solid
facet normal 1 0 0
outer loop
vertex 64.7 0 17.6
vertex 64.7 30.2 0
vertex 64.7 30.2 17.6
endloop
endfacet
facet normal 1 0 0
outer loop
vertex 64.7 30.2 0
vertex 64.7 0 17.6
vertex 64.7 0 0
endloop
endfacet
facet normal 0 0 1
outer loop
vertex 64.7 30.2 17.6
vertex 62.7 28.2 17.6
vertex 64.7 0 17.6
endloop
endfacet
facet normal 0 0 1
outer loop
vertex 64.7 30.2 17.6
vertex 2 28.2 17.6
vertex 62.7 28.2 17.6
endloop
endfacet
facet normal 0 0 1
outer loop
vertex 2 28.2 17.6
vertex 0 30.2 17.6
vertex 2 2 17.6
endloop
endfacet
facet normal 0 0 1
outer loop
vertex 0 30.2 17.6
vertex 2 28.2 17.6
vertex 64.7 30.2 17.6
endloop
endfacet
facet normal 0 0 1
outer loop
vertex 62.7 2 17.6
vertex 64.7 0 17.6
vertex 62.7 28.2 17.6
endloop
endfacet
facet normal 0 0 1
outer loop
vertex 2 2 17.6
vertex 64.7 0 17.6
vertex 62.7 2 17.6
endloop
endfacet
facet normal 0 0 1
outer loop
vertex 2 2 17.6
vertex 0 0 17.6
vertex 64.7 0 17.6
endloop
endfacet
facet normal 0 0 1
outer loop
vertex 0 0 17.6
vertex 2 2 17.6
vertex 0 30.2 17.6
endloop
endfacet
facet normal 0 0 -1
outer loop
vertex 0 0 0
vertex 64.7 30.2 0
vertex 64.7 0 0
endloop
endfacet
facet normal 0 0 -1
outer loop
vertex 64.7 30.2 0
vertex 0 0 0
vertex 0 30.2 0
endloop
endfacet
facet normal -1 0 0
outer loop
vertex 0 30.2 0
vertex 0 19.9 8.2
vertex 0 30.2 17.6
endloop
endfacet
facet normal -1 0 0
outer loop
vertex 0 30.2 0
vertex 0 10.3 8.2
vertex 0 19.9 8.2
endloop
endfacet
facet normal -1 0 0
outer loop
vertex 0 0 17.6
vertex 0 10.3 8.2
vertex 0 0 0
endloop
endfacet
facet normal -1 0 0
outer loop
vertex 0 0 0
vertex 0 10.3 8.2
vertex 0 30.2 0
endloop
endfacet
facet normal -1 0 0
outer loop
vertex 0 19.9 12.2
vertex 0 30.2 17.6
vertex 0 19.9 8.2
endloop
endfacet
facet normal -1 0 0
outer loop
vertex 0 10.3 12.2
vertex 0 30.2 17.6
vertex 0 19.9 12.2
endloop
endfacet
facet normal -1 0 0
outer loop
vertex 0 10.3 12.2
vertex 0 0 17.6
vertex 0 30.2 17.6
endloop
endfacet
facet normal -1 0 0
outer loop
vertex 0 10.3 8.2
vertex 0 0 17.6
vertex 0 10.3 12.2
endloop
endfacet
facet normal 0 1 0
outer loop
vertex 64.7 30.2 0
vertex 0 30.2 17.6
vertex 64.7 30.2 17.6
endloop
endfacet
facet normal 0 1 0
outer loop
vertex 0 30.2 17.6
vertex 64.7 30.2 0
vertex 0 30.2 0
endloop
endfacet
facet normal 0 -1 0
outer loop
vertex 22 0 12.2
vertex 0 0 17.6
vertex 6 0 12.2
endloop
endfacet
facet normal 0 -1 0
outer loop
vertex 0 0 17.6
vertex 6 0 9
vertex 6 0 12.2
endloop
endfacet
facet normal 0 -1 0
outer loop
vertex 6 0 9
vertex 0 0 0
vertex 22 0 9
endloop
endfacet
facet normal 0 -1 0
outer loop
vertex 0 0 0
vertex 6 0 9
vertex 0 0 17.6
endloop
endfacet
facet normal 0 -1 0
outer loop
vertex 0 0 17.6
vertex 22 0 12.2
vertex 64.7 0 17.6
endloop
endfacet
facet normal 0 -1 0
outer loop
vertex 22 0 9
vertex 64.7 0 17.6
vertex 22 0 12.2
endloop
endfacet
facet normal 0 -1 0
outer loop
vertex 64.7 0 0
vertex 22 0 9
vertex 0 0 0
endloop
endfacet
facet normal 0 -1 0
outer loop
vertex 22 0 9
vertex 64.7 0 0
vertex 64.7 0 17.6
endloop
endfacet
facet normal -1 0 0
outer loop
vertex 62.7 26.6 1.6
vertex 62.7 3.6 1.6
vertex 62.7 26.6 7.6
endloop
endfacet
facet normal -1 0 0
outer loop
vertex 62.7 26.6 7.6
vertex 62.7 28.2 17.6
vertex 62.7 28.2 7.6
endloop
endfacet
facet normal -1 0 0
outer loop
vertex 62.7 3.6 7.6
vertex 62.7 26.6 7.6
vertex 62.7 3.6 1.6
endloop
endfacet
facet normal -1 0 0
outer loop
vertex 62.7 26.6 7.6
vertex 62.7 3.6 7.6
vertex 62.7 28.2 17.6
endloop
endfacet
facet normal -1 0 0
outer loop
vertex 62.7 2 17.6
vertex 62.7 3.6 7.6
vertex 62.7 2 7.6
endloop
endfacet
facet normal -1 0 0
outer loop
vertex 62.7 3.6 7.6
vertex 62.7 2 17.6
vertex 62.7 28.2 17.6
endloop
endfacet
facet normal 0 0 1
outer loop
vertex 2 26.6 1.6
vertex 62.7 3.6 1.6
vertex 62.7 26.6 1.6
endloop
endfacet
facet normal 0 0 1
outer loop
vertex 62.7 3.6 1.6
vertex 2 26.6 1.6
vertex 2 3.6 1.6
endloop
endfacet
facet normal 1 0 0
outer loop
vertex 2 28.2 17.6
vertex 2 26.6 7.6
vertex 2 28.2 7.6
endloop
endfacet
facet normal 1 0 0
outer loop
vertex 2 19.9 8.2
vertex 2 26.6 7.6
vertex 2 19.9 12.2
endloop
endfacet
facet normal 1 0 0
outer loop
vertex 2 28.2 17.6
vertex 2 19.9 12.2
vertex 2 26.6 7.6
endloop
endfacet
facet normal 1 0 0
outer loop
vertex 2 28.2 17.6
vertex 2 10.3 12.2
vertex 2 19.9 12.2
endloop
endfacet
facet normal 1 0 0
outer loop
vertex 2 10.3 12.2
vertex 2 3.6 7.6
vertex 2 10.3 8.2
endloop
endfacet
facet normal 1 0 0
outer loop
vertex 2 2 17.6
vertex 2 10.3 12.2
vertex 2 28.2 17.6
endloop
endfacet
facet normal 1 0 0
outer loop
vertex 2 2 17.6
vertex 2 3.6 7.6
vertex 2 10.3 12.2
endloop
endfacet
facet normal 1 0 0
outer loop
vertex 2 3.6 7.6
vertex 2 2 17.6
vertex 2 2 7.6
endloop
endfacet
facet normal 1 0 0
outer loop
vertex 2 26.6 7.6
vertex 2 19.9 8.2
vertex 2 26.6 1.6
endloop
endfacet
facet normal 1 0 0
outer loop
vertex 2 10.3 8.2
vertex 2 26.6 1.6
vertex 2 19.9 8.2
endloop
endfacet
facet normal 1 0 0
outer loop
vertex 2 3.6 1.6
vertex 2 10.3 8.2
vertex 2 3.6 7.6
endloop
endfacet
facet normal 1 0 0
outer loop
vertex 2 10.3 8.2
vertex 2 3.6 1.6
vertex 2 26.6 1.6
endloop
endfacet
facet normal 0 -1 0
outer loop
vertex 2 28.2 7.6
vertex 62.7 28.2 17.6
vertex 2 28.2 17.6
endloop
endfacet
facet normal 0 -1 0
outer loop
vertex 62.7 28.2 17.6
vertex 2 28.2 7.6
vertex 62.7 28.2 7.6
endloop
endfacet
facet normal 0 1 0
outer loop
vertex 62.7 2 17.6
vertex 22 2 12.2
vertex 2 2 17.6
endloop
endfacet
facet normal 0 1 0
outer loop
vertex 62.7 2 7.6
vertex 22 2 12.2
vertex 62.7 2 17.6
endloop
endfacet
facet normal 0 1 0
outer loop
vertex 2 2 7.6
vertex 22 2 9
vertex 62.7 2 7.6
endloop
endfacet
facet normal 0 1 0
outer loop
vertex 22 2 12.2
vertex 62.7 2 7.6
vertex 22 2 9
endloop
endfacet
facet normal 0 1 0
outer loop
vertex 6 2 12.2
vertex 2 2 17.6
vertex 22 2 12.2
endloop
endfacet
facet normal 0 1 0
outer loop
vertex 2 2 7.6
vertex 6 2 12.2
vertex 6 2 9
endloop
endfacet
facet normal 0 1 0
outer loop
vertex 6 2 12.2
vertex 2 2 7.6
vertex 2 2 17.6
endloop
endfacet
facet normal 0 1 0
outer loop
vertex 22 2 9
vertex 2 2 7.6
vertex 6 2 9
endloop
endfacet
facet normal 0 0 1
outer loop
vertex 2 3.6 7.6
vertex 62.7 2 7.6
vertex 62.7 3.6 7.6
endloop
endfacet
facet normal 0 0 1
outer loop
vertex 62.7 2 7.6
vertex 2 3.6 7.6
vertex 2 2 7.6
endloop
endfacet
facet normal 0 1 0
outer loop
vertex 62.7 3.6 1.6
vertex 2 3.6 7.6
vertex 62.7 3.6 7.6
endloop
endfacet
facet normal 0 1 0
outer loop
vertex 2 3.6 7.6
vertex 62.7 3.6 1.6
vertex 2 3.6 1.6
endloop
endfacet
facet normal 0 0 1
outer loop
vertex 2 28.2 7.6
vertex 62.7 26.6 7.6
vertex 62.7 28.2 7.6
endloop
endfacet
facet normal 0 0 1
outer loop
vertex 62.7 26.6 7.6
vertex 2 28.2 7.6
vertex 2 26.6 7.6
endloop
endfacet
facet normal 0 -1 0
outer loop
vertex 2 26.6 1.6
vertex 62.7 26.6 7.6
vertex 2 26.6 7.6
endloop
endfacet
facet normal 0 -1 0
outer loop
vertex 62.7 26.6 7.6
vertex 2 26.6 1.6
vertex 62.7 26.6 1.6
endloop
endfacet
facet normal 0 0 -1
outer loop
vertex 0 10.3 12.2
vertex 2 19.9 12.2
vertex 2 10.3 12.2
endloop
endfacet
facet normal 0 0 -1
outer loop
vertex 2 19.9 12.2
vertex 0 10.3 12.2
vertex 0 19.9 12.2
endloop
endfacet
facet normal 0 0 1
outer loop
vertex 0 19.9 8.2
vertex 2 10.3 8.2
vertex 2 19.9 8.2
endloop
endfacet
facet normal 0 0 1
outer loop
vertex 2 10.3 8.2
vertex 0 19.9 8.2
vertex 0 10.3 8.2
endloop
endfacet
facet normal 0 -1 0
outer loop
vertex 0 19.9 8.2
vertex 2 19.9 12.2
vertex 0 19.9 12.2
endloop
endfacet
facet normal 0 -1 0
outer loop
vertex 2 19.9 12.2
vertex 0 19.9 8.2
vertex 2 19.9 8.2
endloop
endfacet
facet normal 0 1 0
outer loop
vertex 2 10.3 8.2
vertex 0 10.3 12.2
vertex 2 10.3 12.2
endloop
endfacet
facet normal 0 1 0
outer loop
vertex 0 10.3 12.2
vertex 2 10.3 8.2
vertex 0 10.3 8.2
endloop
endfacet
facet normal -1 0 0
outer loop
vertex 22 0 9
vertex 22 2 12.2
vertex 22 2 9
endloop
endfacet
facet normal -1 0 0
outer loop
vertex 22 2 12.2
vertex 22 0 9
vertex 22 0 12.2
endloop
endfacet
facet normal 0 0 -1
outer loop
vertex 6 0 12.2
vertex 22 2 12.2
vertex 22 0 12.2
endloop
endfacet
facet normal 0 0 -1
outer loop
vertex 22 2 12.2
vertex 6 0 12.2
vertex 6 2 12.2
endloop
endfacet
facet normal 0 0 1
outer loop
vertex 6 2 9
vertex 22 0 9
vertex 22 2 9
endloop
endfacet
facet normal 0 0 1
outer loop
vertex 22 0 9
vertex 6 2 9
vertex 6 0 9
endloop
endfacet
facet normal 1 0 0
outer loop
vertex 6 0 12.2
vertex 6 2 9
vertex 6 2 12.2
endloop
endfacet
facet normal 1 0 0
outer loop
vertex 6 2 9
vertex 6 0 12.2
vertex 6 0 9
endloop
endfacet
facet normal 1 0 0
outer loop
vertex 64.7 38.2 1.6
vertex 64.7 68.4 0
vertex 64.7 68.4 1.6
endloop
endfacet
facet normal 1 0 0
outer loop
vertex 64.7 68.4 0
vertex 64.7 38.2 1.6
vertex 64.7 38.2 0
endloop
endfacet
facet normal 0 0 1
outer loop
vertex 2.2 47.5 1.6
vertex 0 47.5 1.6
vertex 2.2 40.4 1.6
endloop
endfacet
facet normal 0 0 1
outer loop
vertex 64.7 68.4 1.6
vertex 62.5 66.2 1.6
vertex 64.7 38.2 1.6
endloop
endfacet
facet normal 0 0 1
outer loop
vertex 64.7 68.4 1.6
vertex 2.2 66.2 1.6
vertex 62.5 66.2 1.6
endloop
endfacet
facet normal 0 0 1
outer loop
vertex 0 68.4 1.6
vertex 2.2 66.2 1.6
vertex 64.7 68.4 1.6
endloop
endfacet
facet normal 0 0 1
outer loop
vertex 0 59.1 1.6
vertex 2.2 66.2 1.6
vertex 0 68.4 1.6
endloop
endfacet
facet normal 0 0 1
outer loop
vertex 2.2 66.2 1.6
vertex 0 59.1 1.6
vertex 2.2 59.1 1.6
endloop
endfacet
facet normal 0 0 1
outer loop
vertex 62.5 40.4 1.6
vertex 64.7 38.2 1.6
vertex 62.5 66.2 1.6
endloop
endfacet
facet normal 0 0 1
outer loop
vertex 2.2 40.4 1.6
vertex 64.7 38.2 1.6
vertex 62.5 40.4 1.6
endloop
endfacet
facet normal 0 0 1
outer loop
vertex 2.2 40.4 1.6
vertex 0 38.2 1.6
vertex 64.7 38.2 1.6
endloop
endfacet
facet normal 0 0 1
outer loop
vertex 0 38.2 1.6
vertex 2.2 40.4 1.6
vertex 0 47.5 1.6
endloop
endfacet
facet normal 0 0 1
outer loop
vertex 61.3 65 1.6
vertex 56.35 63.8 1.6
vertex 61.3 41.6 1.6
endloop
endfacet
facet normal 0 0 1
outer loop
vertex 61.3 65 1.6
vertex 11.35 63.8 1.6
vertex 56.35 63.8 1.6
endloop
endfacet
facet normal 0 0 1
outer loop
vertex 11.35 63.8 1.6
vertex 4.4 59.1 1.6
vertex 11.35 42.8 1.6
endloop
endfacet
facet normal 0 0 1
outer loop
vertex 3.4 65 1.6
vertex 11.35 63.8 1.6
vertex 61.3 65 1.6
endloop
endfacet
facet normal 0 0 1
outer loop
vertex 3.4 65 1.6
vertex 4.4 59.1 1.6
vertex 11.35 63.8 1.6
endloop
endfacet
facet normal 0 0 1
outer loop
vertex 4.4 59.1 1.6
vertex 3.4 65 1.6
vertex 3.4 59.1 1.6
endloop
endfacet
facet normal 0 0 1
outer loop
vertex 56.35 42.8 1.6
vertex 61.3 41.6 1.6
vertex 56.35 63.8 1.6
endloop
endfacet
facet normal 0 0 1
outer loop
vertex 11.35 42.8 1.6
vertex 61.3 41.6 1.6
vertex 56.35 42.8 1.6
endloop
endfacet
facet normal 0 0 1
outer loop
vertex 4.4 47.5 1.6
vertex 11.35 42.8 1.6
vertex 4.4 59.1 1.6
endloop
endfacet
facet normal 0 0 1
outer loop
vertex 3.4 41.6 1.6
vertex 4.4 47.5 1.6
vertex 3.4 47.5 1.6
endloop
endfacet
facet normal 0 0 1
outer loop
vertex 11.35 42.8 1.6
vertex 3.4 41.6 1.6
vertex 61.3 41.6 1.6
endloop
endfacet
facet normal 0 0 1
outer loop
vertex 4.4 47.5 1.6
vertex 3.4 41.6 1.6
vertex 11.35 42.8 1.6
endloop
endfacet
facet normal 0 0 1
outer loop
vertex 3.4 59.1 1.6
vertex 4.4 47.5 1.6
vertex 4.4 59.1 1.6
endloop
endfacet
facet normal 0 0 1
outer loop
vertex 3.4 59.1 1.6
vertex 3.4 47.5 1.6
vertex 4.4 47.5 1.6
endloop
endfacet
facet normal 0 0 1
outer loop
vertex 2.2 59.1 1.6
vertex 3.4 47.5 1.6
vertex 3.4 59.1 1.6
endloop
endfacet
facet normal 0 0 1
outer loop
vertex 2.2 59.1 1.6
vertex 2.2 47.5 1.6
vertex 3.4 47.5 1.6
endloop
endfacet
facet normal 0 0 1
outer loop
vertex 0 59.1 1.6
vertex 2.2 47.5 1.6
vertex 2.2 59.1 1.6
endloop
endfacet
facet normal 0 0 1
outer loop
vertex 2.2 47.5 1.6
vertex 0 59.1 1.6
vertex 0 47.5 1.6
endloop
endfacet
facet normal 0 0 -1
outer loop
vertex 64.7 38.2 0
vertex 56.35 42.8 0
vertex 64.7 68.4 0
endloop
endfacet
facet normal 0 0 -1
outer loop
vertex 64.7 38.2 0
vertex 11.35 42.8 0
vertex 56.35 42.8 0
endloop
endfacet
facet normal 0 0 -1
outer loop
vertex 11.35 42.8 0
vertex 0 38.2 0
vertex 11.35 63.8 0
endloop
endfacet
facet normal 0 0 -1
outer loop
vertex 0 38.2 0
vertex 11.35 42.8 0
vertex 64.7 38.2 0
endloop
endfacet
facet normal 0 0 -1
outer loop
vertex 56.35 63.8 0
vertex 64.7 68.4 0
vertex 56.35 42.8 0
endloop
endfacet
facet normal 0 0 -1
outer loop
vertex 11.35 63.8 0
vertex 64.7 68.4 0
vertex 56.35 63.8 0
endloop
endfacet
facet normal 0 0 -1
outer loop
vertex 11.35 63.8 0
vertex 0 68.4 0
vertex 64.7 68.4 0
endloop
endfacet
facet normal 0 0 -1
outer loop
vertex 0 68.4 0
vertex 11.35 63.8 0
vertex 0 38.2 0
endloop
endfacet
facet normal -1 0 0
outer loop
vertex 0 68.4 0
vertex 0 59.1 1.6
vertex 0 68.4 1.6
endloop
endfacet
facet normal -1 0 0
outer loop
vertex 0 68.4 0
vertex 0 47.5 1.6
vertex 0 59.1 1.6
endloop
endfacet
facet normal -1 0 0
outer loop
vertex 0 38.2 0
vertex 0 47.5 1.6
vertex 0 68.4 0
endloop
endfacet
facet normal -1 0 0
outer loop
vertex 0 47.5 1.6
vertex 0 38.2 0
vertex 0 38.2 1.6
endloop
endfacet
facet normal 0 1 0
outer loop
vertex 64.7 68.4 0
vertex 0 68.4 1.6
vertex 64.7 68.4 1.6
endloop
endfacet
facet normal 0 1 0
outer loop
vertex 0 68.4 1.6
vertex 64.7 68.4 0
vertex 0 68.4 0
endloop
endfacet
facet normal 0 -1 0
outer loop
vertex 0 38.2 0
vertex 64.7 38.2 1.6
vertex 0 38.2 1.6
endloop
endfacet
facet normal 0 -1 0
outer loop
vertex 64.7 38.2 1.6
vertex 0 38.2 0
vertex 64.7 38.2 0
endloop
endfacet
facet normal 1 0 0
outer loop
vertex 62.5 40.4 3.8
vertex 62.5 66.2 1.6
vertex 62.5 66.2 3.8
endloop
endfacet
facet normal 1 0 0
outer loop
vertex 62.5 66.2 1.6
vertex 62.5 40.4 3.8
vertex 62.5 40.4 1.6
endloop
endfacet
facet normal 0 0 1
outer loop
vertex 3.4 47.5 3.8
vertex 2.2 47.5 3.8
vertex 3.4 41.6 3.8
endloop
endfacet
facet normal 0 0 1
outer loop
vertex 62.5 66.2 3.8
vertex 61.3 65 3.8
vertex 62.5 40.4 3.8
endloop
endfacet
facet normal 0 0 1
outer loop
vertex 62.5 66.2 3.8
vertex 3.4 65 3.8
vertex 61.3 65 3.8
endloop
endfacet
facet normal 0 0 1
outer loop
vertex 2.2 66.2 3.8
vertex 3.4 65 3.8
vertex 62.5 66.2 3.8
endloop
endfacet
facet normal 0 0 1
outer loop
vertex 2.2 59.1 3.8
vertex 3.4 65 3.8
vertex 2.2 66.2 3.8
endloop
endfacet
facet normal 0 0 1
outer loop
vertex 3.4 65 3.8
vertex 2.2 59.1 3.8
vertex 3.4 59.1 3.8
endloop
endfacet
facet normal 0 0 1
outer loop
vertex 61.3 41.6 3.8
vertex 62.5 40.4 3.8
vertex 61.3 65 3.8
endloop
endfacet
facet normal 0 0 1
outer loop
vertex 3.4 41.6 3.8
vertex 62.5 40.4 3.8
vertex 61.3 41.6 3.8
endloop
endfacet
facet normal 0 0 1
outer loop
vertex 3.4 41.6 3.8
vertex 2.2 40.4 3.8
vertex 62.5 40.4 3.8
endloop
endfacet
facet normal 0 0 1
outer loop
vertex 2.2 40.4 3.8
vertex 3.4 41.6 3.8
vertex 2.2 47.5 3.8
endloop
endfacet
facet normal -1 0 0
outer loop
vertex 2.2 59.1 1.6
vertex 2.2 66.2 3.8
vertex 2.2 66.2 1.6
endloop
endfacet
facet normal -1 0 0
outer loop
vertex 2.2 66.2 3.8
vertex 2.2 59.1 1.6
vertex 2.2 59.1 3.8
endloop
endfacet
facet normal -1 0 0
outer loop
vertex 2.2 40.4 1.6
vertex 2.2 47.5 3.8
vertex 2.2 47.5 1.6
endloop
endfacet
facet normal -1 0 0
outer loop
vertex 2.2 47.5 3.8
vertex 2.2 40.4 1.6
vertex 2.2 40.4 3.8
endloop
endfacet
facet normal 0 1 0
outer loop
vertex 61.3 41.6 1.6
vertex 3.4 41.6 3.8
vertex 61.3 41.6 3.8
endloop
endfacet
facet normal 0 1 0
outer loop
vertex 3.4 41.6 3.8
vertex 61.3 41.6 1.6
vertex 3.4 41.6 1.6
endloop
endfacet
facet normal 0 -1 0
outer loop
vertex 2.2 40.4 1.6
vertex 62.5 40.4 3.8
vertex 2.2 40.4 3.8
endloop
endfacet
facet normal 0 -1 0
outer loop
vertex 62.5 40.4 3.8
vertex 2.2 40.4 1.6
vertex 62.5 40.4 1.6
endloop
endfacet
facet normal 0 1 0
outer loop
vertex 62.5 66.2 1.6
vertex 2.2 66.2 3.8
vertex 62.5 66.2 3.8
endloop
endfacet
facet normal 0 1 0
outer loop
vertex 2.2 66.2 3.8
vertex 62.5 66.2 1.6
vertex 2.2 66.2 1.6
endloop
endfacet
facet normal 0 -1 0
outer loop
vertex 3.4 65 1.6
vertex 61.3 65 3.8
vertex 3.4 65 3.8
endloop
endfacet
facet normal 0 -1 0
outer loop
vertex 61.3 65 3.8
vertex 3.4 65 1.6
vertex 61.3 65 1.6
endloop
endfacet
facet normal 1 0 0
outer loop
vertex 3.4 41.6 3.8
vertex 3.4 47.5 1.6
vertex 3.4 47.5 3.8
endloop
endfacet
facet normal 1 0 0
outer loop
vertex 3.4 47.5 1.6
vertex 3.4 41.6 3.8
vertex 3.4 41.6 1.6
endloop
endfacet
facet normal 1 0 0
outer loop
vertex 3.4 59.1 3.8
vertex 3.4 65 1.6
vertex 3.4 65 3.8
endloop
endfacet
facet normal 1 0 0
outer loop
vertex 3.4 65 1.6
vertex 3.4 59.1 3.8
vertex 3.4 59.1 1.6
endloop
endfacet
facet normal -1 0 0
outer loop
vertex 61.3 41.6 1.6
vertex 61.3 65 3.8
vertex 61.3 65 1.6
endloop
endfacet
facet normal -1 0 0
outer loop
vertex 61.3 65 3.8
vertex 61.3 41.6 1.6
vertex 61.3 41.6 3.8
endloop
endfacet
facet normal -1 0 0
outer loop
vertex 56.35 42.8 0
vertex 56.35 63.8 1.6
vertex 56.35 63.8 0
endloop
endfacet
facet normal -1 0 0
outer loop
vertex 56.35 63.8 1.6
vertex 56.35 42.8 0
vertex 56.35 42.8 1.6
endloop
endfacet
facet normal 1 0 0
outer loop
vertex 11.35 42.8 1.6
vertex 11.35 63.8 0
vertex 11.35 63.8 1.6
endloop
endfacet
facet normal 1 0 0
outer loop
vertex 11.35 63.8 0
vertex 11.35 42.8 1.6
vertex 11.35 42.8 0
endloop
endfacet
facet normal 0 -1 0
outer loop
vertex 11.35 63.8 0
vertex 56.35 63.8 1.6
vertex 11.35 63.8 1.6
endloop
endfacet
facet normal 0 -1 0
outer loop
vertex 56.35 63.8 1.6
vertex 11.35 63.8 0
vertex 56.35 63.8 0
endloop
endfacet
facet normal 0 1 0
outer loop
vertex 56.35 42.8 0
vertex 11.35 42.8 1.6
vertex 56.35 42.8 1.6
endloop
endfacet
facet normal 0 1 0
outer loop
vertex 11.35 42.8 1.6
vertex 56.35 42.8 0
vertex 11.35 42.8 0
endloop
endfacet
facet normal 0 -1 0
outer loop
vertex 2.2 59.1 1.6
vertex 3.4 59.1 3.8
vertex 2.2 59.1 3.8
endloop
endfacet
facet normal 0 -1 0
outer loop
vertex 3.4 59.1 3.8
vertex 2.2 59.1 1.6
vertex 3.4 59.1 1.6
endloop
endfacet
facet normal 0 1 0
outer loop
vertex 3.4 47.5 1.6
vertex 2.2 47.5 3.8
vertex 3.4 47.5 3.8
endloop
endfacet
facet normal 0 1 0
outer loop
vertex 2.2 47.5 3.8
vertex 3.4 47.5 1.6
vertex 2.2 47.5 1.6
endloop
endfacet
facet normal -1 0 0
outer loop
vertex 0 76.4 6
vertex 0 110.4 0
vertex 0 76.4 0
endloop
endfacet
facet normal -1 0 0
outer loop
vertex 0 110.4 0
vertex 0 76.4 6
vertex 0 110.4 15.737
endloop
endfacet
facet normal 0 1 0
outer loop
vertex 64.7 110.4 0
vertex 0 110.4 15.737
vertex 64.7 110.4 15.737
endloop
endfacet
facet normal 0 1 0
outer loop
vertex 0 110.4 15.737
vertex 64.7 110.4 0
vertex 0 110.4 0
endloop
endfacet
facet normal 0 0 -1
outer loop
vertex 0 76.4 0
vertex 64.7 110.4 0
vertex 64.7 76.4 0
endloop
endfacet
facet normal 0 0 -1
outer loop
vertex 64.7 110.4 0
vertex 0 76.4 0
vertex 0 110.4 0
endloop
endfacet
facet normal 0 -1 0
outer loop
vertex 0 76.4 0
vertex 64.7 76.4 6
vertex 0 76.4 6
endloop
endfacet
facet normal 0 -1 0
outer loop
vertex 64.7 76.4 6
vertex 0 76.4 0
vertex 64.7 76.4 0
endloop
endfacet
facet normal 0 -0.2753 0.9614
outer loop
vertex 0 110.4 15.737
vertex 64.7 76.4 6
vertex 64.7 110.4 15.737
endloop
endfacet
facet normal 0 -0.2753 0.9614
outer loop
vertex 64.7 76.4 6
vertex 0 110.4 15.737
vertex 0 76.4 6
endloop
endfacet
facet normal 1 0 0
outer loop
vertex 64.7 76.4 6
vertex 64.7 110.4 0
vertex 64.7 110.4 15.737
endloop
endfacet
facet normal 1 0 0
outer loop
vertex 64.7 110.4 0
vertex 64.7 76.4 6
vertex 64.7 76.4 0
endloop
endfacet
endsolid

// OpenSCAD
// Корпус для LilyGO T-Display-S3 AMOLED (1,91″) — тот же, что генерирует case.py.
// Откройте в OpenSCAD, выберите part и экспортируйте STL (F6 → F7).
// Размеры в мм; сверьте с вашей платой перед печатью.

part = "all";          // "tray" | "bezel" | "stand" | "all"

board_l = 60.0;  board_w = 25.5;  board_t = 10.0;
clear = 0.35;    wall = 2.0;      floor_t = 1.6;
battery_h = 6.0; ledge = 1.6;
usb_w = 9.6;  usb_h = 4.0;  usb_z = 2.6;
btn_from = 4.0;  btn_len = 16.0;  btn_h = 3.2;  btn_z = 3.0;
win_l = 45.0;  win_w = 21.0;  win_dx = 1.5;  win_dy = 0.0;
bezel_t = 1.6;  lip_h = 2.2;  lip_t = 1.2;  lip_gap = 0.2;
stand_angle = 22;  stand_depth = 34;  stand_lip = 4;

il = board_l + 2*clear;   iw = board_w + 2*clear;
ol = il + 2*wall;         ow = iw + 2*wall;
board_z0 = floor_t + battery_h;
oh = board_z0 + board_t;

module box(a, b) translate(a) cube([b[0]-a[0], b[1]-a[1], b[2]-a[2]]);

module tray() difference() {
    union() {
        difference() {
            cube([ol, ow, oh]);
            box([wall, wall, floor_t], [wall+il, wall+iw, oh+1]);
        }
        if (battery_h > 0) {
            box([wall, wall, floor_t], [wall+il, wall+ledge, board_z0]);
            box([wall, wall+iw-ledge, floor_t], [wall+il, wall+iw, board_z0]);
        }
    }
    uz = board_z0 + usb_z;
    box([-1, ow/2-usb_w/2, uz-usb_h/2], [wall+0.5, ow/2+usb_w/2, uz+usb_h/2]);
    bz = board_z0 + btn_z;
    box([wall+btn_from, -1, bz-btn_h/2], [wall+btn_from+btn_len, wall+0.5, bz+btn_h/2]);
}

module bezel() {        // печатать лицом вниз
    cx = ol/2 + win_dx;  cy = ow/2 + win_dy;
    x0 = wall+lip_gap; y0 = wall+lip_gap; x1 = wall+il-lip_gap; y1 = wall+iw-lip_gap;
    lh = bezel_t + lip_h;
    difference() {
        union() {
            cube([ol, ow, bezel_t]);
            box([x0, y0, bezel_t], [x1, y0+lip_t, lh]);
            box([x0, y1-lip_t, bezel_t], [x1, y1, lh]);
            box([x0, y0, bezel_t], [x0+lip_t, y1, lh]);
            box([x1-lip_t, y0, bezel_t], [x1, y1, lh]);
        }
        box([cx-win_l/2, cy-win_w/2, -1], [cx+win_l/2, cy+win_w/2, bezel_t+1]);
        box([-1, ow/2-usb_w/2-1, bezel_t], [wall+lip_t+lip_gap+1, ow/2+usb_w/2+1, lh+1]);
    }
}

module stand() {
    h = stand_depth * tan(stand_angle);
    rotate([90, 0, 90]) linear_extrude(ol)
        polygon([[0, 0], [stand_depth, 0], [stand_depth, h+2], [0, 2+stand_lip]]);
}

if (part == "tray")  tray();
if (part == "bezel") bezel();
if (part == "stand") stand();
if (part == "all") {
    tray();
    translate([0, ow + 8, 0]) bezel();
    translate([0, 2*ow + 16, 0]) stand();
}
